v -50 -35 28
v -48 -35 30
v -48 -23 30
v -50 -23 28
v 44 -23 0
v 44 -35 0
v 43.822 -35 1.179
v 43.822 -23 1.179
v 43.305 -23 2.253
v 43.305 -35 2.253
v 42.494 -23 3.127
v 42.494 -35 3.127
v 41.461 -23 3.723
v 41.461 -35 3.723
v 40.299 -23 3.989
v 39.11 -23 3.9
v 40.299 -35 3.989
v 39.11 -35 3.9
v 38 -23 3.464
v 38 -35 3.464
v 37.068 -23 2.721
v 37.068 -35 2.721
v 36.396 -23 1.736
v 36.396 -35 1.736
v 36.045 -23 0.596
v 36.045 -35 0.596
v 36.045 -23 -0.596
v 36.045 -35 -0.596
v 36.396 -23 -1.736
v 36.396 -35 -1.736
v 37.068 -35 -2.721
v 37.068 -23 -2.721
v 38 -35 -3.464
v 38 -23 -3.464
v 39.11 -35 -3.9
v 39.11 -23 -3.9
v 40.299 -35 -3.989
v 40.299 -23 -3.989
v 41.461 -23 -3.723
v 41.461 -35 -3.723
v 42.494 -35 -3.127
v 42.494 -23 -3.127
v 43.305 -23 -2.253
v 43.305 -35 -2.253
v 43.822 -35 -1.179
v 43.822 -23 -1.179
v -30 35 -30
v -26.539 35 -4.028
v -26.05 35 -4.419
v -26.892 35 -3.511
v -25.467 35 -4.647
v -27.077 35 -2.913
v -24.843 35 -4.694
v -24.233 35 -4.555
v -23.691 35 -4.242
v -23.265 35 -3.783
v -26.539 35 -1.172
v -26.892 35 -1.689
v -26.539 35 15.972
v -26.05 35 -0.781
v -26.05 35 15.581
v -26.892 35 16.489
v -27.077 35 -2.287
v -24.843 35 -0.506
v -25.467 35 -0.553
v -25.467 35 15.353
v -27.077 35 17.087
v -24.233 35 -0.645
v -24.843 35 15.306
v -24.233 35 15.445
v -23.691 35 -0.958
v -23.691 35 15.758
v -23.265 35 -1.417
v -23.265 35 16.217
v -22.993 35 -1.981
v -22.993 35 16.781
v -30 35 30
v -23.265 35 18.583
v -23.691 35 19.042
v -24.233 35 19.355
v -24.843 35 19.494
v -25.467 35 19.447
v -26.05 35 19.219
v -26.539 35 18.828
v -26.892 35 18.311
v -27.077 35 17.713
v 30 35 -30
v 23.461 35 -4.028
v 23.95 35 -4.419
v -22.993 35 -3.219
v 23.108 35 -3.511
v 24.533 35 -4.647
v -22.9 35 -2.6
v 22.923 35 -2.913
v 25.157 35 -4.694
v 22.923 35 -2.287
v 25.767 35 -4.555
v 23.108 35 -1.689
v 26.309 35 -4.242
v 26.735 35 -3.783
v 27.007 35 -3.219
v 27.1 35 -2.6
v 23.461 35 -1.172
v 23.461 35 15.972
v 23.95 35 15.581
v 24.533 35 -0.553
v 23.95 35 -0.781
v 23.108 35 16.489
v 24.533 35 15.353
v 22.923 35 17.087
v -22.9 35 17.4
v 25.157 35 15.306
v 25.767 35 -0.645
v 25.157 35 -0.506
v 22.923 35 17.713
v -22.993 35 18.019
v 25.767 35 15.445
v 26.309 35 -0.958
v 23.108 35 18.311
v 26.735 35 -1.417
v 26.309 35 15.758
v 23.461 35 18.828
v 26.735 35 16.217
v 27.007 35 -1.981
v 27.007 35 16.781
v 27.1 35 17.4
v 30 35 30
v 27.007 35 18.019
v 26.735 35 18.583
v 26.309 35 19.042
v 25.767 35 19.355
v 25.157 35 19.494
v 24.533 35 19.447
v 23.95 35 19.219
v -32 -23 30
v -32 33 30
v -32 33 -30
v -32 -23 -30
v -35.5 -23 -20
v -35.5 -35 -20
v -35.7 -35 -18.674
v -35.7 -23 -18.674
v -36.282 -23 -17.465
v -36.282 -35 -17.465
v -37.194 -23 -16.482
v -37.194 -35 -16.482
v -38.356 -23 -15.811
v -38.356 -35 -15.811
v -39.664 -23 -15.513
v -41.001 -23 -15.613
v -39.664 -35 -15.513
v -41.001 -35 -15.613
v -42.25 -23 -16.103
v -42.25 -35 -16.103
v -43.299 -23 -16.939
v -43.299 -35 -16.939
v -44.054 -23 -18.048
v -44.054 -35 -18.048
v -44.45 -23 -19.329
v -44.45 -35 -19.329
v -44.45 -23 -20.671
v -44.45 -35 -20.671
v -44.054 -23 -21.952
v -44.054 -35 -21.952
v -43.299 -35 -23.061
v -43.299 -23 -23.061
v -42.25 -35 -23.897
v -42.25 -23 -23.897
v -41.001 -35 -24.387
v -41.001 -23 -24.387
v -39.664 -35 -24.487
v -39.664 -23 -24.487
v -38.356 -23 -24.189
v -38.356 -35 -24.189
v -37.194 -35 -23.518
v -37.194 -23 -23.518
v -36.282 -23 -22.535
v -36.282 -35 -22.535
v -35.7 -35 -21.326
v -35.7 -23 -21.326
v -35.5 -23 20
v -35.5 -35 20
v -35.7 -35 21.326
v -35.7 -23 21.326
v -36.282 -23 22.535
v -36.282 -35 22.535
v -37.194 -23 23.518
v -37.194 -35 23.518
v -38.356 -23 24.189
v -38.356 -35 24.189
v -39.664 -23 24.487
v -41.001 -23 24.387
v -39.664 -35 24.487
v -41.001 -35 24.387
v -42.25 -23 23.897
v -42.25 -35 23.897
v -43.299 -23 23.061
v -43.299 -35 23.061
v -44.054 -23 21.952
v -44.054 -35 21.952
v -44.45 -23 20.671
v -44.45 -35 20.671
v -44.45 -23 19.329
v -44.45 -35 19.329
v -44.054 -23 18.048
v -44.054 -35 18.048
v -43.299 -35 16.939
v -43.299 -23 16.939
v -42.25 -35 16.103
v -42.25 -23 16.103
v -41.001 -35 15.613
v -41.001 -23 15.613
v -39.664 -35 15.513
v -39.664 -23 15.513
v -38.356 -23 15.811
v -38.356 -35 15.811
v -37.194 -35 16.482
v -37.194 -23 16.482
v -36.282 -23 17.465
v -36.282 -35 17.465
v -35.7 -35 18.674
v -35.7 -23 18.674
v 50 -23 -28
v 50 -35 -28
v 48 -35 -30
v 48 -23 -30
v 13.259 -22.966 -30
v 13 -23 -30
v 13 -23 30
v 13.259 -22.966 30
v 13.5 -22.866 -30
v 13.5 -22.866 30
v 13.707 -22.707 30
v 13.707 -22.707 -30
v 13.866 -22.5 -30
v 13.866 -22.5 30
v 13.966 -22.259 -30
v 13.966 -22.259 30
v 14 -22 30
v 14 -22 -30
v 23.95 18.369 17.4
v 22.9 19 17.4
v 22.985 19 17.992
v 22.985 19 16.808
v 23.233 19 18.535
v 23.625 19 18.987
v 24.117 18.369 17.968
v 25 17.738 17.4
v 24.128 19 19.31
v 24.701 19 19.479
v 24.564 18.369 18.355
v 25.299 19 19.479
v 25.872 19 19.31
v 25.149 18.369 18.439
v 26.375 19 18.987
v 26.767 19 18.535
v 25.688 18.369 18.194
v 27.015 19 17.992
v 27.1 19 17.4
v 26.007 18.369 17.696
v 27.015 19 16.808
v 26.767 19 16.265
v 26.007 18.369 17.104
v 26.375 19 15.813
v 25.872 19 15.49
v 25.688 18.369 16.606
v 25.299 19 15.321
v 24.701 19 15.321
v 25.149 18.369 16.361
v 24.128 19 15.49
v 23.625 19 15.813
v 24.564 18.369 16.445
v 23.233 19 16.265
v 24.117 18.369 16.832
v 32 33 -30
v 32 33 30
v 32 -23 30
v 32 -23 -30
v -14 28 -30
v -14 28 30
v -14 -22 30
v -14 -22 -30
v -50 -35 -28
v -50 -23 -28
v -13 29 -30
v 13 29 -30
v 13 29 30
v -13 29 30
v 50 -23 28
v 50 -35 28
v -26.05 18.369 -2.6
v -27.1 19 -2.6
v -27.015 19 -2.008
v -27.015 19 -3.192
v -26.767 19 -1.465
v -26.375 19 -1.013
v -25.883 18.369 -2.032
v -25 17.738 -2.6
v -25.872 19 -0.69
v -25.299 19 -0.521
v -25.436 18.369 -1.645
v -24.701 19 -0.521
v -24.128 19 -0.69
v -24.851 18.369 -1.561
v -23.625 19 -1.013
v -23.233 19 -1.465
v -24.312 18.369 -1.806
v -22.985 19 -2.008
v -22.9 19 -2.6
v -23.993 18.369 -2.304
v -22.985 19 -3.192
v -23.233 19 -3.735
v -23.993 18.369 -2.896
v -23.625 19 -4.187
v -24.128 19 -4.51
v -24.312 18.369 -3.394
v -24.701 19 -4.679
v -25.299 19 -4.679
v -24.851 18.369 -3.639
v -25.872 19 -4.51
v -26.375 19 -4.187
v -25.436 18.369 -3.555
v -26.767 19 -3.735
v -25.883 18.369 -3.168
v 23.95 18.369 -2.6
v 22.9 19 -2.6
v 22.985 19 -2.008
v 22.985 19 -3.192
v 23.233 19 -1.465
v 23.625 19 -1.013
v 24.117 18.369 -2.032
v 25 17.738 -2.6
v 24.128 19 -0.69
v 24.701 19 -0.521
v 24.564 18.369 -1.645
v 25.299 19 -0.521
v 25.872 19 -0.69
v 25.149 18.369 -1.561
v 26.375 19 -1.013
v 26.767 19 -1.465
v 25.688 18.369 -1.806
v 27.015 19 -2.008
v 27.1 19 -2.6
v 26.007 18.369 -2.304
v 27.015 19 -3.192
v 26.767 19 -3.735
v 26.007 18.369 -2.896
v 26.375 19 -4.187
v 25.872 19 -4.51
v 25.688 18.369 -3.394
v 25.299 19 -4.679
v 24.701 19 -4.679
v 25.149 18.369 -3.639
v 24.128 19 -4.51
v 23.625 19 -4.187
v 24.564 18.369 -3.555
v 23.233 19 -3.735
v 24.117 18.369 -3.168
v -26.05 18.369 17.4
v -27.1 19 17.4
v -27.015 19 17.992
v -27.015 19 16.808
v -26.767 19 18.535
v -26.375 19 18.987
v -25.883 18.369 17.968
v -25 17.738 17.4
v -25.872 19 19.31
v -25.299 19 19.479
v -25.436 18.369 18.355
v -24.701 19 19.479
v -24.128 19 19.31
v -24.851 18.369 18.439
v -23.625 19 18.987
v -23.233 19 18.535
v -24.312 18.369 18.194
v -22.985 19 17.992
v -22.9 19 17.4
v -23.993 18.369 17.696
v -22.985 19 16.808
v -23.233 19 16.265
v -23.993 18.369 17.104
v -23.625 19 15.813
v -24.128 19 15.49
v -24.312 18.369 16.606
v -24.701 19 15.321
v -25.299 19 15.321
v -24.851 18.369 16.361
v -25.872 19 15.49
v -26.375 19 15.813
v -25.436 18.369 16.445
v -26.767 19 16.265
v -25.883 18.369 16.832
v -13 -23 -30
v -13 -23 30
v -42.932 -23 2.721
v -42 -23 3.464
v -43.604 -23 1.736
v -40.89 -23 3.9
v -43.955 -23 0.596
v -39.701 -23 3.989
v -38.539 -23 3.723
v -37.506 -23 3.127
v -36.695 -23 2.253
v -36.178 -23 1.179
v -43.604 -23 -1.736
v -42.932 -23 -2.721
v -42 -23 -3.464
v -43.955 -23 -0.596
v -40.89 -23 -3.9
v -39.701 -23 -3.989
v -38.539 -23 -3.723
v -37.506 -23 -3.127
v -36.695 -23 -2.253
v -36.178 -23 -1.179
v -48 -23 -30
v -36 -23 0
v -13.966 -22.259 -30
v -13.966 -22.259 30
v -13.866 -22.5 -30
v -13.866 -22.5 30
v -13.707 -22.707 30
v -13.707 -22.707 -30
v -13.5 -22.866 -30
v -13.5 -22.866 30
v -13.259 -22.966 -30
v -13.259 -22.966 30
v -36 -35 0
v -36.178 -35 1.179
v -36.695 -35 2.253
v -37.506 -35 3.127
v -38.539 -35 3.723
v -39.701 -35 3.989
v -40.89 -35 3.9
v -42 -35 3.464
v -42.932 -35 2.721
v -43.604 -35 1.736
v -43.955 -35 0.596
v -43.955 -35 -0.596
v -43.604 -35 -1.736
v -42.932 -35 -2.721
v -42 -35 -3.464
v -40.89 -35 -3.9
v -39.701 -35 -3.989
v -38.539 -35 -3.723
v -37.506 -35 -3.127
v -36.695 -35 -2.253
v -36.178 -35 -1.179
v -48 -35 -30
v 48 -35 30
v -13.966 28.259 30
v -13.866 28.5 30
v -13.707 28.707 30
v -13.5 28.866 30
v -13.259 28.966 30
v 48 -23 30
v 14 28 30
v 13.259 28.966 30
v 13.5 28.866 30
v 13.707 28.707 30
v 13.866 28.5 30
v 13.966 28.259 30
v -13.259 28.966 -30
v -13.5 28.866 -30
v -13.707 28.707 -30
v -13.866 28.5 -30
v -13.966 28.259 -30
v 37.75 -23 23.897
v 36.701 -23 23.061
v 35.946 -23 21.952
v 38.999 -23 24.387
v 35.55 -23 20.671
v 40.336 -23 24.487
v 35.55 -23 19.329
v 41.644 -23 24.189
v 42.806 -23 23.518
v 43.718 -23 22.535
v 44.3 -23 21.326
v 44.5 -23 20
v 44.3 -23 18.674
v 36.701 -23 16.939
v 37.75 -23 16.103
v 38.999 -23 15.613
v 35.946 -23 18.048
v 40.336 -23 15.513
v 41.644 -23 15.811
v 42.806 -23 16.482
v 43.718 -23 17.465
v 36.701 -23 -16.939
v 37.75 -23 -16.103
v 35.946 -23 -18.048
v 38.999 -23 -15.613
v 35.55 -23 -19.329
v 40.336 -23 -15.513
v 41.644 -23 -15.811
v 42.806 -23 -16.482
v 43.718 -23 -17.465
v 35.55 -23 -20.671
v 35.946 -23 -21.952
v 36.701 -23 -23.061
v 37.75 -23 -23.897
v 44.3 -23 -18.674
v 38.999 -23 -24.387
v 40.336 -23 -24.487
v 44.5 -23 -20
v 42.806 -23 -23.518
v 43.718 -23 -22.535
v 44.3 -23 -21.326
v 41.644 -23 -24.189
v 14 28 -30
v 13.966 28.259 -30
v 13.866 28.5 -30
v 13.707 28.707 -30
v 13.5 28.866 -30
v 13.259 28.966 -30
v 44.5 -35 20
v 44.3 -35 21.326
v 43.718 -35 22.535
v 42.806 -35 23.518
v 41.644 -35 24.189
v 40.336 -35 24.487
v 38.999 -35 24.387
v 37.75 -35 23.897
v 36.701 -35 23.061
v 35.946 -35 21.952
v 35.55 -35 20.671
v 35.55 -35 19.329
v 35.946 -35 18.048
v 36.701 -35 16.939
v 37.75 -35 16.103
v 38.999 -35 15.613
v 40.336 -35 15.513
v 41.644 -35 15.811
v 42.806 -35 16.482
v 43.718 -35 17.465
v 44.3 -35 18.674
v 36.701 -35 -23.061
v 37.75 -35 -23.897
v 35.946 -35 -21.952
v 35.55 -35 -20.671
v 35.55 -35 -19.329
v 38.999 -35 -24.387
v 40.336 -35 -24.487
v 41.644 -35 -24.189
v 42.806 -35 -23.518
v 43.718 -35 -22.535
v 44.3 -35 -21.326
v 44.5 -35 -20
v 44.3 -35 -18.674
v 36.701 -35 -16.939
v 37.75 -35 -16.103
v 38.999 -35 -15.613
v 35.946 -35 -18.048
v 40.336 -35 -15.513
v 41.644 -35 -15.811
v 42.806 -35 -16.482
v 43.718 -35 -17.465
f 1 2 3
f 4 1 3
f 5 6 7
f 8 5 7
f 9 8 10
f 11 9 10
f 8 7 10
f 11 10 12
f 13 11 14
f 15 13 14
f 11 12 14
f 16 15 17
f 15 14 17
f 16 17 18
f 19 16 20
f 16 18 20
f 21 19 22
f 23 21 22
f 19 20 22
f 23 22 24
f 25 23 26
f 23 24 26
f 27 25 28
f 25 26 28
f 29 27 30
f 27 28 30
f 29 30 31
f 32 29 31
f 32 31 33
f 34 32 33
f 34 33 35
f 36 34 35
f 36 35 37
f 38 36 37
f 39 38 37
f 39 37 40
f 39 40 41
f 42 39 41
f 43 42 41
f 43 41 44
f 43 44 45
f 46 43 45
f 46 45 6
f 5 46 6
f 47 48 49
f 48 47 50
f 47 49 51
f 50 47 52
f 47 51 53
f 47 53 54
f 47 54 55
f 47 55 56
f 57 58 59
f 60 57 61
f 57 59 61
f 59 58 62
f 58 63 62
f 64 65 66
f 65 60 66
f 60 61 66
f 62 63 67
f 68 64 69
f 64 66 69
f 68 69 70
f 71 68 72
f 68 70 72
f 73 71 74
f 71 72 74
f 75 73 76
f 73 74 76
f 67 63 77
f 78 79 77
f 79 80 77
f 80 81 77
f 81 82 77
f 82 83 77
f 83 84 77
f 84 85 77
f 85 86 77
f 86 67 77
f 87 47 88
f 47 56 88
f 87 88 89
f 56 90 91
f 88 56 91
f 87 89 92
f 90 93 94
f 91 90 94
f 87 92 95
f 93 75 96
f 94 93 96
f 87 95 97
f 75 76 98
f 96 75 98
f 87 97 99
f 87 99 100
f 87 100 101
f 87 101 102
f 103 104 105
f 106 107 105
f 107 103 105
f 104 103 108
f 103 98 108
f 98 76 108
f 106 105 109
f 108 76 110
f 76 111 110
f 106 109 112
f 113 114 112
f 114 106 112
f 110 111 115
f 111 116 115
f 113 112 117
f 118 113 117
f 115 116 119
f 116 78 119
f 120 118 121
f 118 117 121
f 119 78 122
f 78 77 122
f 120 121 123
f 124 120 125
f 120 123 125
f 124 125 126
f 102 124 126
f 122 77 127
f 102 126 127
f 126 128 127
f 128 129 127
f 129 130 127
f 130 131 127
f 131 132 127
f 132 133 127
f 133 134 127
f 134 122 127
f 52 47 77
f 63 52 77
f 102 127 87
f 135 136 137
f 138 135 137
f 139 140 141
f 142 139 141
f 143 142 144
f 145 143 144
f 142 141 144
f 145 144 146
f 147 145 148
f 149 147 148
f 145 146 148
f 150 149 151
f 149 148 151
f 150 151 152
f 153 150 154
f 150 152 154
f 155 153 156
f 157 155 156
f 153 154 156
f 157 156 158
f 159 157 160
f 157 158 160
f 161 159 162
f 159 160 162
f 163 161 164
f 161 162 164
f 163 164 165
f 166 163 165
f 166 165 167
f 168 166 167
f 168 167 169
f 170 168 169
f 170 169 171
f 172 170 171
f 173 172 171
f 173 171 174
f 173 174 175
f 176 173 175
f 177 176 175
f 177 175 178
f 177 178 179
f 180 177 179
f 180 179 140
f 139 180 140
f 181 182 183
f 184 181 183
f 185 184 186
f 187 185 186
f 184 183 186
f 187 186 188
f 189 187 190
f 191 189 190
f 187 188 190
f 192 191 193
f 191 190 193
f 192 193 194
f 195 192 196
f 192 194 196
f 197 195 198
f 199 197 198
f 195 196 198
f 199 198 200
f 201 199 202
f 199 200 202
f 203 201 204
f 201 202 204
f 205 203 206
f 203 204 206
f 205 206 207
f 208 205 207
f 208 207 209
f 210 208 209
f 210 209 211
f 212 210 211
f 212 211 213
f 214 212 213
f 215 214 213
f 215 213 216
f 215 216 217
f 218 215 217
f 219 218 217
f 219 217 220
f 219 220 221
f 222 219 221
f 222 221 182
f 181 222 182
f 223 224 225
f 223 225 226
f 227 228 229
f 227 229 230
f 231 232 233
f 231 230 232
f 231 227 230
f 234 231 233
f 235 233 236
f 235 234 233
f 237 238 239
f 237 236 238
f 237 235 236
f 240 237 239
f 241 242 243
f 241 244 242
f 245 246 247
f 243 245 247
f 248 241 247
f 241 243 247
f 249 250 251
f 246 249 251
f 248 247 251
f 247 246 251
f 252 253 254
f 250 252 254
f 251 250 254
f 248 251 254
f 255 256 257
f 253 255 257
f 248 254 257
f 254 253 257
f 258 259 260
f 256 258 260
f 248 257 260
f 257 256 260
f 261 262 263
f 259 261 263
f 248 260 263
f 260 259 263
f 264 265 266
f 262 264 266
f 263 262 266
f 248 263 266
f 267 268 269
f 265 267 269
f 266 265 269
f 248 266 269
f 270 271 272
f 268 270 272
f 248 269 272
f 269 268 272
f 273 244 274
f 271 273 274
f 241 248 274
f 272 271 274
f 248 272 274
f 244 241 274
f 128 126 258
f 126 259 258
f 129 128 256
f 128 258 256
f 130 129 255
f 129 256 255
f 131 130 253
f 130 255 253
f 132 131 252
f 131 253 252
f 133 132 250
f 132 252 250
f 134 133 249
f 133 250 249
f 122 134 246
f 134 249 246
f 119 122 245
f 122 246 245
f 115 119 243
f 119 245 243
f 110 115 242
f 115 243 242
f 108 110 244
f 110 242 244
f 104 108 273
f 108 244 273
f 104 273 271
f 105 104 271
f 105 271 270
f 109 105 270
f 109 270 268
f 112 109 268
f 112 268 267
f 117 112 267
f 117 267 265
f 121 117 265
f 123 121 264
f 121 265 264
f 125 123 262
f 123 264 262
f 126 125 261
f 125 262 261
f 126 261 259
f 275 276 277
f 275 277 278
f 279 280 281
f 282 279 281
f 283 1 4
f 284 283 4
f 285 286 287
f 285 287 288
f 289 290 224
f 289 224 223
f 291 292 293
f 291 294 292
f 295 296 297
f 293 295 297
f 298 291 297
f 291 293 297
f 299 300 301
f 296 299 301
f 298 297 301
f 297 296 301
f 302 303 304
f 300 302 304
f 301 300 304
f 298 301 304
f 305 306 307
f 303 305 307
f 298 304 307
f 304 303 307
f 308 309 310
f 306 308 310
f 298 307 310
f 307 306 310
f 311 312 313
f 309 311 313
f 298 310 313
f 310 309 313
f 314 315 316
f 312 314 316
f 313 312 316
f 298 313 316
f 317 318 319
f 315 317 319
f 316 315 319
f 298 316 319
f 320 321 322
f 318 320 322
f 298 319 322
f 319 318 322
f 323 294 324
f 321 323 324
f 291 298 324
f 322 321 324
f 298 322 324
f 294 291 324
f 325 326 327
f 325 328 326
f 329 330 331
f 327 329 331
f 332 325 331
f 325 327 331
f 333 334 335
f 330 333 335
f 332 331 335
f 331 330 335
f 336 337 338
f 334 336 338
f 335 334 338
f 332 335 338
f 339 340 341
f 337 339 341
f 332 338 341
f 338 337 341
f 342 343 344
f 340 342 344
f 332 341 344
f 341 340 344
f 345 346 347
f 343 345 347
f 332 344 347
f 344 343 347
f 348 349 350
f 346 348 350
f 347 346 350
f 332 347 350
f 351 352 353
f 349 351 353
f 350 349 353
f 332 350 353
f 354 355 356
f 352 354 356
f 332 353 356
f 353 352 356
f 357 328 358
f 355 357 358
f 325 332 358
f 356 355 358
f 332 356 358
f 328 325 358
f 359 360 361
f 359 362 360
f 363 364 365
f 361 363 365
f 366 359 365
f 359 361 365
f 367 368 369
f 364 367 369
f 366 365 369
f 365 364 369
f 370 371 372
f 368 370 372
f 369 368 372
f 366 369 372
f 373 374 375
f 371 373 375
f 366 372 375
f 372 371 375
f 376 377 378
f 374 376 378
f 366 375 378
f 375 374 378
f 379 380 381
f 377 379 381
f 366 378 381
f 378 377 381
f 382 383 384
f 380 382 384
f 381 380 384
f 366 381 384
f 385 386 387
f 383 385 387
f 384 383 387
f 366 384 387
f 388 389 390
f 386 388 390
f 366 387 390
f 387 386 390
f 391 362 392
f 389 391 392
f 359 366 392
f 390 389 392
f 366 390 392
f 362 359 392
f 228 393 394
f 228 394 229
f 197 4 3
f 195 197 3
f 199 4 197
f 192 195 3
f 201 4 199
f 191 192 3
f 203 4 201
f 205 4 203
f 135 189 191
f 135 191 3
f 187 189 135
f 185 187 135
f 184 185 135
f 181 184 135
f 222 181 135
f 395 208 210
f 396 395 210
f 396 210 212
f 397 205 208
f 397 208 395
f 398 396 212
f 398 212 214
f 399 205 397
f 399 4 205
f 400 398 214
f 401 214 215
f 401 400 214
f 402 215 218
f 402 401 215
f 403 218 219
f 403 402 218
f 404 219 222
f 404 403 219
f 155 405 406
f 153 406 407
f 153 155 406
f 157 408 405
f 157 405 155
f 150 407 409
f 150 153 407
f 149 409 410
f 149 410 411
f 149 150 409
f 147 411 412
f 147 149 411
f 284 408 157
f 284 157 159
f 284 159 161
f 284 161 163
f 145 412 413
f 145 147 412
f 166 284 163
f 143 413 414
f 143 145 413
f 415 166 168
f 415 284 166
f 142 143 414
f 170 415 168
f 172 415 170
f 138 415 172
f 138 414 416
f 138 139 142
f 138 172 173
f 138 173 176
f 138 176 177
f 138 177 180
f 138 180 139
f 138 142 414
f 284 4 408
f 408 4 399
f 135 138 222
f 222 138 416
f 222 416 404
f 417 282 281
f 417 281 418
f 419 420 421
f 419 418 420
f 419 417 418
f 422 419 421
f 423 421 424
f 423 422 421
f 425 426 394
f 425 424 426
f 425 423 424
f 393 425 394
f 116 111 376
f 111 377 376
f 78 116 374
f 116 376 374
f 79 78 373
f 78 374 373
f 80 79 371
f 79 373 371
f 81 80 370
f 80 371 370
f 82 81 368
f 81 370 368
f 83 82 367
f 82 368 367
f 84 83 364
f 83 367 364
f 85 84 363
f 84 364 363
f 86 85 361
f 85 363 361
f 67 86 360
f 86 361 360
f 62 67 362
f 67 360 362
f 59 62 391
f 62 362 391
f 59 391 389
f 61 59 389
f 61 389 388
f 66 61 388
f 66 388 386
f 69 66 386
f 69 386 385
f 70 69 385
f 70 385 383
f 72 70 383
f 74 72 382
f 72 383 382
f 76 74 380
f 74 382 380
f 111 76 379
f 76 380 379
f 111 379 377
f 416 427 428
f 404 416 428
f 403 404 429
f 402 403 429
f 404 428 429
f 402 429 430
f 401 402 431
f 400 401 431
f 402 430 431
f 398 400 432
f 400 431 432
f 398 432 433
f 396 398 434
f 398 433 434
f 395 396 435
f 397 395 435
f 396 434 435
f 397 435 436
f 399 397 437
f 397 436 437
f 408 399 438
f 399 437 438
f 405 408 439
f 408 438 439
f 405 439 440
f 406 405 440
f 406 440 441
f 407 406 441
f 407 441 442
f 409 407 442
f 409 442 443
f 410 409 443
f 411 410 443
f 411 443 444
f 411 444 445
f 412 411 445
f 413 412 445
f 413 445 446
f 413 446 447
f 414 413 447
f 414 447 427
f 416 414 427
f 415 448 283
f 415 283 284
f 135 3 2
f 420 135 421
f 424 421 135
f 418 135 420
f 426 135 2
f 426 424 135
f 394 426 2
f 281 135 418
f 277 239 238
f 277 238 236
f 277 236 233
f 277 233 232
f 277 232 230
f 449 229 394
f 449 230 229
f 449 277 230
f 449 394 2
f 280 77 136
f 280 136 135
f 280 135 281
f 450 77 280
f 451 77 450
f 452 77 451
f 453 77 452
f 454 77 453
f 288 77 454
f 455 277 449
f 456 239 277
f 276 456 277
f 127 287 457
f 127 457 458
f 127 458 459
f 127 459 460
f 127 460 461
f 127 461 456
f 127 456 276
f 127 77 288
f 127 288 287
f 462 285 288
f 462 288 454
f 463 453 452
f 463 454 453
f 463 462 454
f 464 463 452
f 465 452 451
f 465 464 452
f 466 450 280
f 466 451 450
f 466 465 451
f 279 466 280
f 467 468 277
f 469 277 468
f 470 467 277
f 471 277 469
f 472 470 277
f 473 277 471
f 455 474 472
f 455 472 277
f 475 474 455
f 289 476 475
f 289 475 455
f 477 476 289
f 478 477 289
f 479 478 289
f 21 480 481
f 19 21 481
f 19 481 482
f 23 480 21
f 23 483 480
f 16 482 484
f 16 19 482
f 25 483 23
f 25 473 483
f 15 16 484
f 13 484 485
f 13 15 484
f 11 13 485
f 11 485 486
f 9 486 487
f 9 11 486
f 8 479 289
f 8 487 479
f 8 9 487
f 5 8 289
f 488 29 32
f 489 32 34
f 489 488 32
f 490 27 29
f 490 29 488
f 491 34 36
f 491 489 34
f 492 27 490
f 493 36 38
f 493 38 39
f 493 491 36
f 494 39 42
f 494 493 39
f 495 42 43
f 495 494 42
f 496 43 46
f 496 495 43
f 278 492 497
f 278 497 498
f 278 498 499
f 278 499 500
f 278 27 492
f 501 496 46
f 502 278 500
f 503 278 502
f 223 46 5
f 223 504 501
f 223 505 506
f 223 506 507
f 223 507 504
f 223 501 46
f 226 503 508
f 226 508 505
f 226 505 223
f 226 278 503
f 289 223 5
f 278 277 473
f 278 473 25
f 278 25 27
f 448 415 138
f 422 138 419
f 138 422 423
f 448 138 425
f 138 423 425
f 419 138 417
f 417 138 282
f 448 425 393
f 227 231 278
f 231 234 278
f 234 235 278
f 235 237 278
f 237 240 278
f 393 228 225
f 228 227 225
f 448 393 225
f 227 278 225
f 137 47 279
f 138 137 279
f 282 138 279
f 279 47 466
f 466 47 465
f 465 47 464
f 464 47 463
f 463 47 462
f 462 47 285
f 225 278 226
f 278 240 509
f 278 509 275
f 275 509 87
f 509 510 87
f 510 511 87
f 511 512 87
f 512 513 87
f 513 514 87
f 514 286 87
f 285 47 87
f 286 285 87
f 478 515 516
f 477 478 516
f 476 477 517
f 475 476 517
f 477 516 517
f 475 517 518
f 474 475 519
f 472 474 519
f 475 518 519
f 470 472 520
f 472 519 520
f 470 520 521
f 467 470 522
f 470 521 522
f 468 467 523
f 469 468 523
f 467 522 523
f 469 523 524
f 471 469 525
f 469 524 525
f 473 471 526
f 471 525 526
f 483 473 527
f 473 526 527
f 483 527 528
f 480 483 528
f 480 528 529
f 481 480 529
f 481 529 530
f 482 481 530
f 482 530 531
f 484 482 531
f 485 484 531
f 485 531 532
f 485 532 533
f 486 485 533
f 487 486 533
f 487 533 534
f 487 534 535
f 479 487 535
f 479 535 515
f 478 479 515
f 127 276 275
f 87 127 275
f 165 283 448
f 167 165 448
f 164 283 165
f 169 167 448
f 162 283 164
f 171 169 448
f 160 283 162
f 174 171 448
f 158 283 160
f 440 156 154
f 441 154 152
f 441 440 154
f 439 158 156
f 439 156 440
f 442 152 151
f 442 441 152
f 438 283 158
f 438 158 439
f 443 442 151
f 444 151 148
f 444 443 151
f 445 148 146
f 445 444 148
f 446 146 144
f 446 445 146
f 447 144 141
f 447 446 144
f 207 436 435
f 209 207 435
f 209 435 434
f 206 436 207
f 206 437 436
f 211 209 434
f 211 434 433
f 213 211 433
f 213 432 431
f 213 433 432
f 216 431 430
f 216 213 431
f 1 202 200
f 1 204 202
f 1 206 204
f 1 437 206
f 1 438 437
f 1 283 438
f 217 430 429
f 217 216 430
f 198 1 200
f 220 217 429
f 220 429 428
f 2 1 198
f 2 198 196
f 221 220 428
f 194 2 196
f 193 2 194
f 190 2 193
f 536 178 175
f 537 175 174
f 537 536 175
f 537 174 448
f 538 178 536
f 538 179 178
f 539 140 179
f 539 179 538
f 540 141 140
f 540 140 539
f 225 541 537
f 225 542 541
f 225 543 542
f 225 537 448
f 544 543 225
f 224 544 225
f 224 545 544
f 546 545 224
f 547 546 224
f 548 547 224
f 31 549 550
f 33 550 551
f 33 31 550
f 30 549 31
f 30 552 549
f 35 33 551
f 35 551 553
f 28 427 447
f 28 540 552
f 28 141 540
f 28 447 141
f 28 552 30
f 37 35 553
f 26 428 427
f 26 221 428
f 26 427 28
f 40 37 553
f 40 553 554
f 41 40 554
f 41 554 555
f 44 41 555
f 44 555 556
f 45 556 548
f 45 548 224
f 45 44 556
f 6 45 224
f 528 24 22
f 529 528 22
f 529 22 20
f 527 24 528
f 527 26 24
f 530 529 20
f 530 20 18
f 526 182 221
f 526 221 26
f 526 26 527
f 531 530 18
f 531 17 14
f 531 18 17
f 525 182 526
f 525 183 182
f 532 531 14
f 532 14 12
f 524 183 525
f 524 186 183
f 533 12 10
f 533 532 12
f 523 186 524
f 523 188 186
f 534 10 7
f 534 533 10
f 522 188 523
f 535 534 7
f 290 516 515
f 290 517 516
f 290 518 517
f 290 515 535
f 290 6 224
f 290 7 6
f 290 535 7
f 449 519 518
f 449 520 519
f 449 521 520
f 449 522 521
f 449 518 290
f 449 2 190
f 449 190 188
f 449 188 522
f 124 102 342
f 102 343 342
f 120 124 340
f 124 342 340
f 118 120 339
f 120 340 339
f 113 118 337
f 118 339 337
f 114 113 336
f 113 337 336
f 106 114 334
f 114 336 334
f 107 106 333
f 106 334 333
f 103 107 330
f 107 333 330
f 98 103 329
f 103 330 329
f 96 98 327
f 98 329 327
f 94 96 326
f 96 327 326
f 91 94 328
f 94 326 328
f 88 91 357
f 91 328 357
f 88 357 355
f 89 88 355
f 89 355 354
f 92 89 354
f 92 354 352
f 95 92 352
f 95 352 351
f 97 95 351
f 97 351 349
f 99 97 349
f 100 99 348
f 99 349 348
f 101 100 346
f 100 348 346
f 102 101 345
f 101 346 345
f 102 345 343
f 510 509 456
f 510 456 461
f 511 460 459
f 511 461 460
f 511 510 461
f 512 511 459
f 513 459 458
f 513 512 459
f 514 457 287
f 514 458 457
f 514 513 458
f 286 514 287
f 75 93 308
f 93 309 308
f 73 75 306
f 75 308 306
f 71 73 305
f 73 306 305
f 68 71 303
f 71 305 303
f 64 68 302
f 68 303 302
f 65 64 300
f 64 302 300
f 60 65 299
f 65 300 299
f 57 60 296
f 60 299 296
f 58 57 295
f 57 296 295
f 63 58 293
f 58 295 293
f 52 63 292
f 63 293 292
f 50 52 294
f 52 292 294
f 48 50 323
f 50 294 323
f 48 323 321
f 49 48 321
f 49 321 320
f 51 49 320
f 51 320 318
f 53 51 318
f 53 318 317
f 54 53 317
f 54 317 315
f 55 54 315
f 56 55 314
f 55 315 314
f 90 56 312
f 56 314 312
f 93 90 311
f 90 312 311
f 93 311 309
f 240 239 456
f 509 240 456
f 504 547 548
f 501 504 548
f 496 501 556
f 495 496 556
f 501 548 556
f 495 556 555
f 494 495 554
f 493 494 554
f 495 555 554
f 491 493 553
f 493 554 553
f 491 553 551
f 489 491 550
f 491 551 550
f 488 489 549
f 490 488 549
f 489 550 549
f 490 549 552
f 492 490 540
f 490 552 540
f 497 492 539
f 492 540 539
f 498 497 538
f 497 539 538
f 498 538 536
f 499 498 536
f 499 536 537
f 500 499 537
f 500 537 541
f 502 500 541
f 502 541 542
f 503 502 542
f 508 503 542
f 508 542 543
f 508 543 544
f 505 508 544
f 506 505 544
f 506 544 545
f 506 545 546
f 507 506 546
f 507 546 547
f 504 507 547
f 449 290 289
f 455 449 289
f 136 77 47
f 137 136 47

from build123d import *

# Parameters (mm, degrees)
SKETCH_1_W             = 100
SKETCH_1_H             = 70
EXTRUDE_1_DEPTH        = 30
SKETCH_2_W             = 18
SKETCH_2_H             = 60
CUT_EXTRUDE_1_DEPTH    = 58
HOLE_WIZARD_9_0_9_1_D  = 9
CUT_EXTRUDE_2_REACH    = 87.586
HOLE_WIZARD_8_0_8_1_D  = 8
HOLE_WIZARD_M5_1_D     = 4.2
HOLE_WIZARD_M5_1_DEPTH = 16
HOLE_WIZARD_M5_1_TIP   = 1.2618073
CHAMFER_1_SIZE         = 2


with BuildPart() as part:
    # 草圖1 → 伸長1 (new, symmetric)
    with BuildSketch(Plane.XY):
        Rectangle(SKETCH_1_W, SKETCH_1_H)
    extrude(amount=EXTRUDE_1_DEPTH, both=True)

    # 草圖2 → 除料-伸長1 (cut)
    with BuildSketch(Plane(origin=(0, 35, 0), x_dir=(1, 0, 0), z_dir=(0, 1, 0))):
        with Locations((41, 0)):
            Rectangle(SKETCH_2_W, SKETCH_2_H)
        with Locations((-41, 0)):
            Rectangle(SKETCH_2_W, SKETCH_2_H)
    extrude(amount=-CUT_EXTRUDE_1_DEPTH, mode=Mode.SUBTRACT)

    # Ø9.0 (9) 直徑孔1 (through all)
    with Locations(Plane(origin=(-40, -23, 55), x_dir=(-1, 0, 0), z_dir=(0, 1, 0))):
        with Locations((0, -75), (-80, -75), (-80, -35), (0, -35)):
            Hole(HOLE_WIZARD_9_0_9_1_D / 2)

    # 草圖17 → 除料-伸長2 (cut, up to next)
    with BuildSketch(Plane(origin=(0, 0, -30), x_dir=(-1, 0, 0), z_dir=(0, 0, -1)), mode=Mode.PRIVATE) as cut_extrude_2_sk1:
        with BuildLine():
            Line((13, -23), (-13, -23))
            ThreePointArc((-13, -23), (-13.707106781, -22.707106781), (-14, -22))
            Line((-14, -22), (-14, 28))
            ThreePointArc((-14, 28), (-13.707106781, 28.707106781), (-13, 29))
            Line((-13, 29), (13, 29))
            ThreePointArc((13, 29), (13.707106781, 28.707106781), (14, 28))
            Line((14, 28), (14, -22))
            ThreePointArc((14, -22), (13.707106781, -22.707106781), (13, -23))
        make_face()
    cut_extrude_2_tool1 = extrude(cut_extrude_2_sk1.sketch, amount=-CUT_EXTRUDE_2_REACH, mode=Mode.PRIVATE) & part.part
    add(cut_extrude_2_tool1.solids().sort_by_distance((0, 3, -30))[0], mode=Mode.SUBTRACT)

    # Ø8.0 (8) 直徑孔1 (through all)
    with Locations(Plane(origin=(20, -23, 5.325436893), x_dir=(-1, 0, 0), z_dir=(0, 1, 0))):
        with Locations((60, -5.325436893), (-20, -5.325436893)):
            Hole(HOLE_WIZARD_8_0_8_1_D / 2)

    # M5 螺紋孔1
    with Locations(Plane(origin=(0, 35, 0), x_dir=(-1, 0, 0), z_dir=(0, 1, 0))):
        with Locations((25, 17.4), (-25, 17.4), (-25, -2.6), (25, -2.6)):
            Hole(HOLE_WIZARD_M5_1_D / 2, depth=HOLE_WIZARD_M5_1_DEPTH)
            with Locations((0, 0, -(HOLE_WIZARD_M5_1_DEPTH + HOLE_WIZARD_M5_1_TIP / 2))):  # 118° drill point
                Cone(0, HOLE_WIZARD_M5_1_D / 2, HOLE_WIZARD_M5_1_TIP, mode=Mode.SUBTRACT)

    # 導角1
    chamfer_1_edges = [part.edges().sort_by_distance(p)[0] for p in [
        (50, -29, 30),
        (32, 35, 0),
        (-50, -29, -30),
        (-50, -29, 30),
        (-32, 35, 0),
        (50, -29, -30),
    ]]
    chamfer(chamfer_1_edges, length=CHAMFER_1_SIZE)


solid = part.part
